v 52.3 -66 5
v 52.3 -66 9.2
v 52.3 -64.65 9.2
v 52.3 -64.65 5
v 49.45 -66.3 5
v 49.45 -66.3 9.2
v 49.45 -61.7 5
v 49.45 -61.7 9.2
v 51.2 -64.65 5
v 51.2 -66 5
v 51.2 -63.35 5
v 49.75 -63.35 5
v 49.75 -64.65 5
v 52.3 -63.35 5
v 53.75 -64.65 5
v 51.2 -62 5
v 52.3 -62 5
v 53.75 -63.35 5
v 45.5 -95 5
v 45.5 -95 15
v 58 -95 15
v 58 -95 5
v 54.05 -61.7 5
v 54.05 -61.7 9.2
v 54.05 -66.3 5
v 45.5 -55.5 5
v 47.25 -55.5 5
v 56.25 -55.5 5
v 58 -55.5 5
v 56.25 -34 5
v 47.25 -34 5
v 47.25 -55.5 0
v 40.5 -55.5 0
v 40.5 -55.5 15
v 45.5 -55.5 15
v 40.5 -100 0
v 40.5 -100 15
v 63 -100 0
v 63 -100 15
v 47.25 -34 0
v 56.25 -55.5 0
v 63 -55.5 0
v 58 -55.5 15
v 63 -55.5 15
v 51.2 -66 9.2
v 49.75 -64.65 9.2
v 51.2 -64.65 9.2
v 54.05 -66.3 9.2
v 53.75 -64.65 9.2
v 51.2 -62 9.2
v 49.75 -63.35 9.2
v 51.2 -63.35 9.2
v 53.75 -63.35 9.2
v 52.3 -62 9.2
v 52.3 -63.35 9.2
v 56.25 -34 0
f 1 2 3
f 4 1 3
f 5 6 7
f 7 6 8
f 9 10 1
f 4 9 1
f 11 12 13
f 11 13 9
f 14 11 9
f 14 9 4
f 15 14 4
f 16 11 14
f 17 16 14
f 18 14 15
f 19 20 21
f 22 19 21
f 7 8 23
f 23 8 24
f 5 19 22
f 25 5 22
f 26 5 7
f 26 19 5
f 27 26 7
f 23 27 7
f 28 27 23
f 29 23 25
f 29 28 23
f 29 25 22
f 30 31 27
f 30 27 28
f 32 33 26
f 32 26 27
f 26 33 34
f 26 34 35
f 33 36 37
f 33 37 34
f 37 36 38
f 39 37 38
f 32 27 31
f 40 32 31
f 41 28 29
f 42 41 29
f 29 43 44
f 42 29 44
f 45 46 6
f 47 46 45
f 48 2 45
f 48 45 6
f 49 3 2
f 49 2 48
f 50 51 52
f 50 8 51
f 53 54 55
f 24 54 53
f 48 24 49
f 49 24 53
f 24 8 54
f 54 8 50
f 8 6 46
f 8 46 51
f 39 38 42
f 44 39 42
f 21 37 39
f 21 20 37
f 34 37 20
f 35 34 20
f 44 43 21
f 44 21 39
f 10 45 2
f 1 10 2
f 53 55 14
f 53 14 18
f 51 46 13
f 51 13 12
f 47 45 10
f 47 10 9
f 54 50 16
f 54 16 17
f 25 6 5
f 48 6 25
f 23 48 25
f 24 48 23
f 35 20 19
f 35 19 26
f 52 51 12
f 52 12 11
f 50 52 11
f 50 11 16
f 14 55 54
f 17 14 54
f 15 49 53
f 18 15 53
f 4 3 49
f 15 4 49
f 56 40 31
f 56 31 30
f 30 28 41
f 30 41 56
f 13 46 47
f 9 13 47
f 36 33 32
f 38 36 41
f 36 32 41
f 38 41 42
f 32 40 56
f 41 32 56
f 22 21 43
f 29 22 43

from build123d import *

# Parameters (mm, degrees)
SKETCH_W        = 22.5
SKETCH_H        = 66
PAD_DEPTH       = 15
SKETCH001_W     = 12.5
SKETCH001_H     = 75
SKETCH001_W_2   = 4.6
SKETCH001_H_2   = 4.6
POCKET_DEPTH    = 10
SKETCH002_W     = 7
SKETCH002_H     = 7
POCKET001_DEPTH = 5.8
SKETCH004_W     = 1.1
SKETCH004_H     = 4
POCKET002_DEPTH = 10
SKETCH005_W     = 4
SKETCH005_H     = 1.3
POCKET003_DEPTH = 10
SKETCH007_W     = 19.75
SKETCH007_H     = 26.5
SKETCH007_W_2   = 17.25
POCKET004_DEPTH = 20


with BuildPart() as part:
    # Sketch → Pad (new body)
    with BuildSketch(Plane.XY):
        with Locations((51.75, -67)):
            Rectangle(SKETCH_W, SKETCH_H)
    extrude(amount=PAD_DEPTH)

    # Sketch001 (on DatumPlane) → Pocket (cut)
    with BuildSketch(Plane.XY.offset(15)):
        with Locations((51.75, -57.5)):
            Rectangle(SKETCH001_W, SKETCH001_H)
        with Locations((51.75, -64)):
            Rectangle(SKETCH001_W_2, SKETCH001_H_2, mode=Mode.SUBTRACT)
    extrude(amount=-POCKET_DEPTH, mode=Mode.SUBTRACT)

    # Sketch002 (on DatumPlane) → Pocket001 (cut)
    with BuildSketch(Plane.XY.offset(15)):
        with Locations((51.5, -63.5)):
            Rectangle(SKETCH002_W, SKETCH002_H)
    extrude(amount=-POCKET001_DEPTH, mode=Mode.SUBTRACT)

    # Sketch004 (on DatumPlane) → Pocket002 (cut)
    with BuildSketch(Plane.XY.offset(15)):
        with Locations((51.75, -64)):
            Rectangle(SKETCH004_W, SKETCH004_H)
    extrude(amount=-POCKET002_DEPTH, mode=Mode.SUBTRACT)

    # Sketch005 (on DatumPlane) → Pocket003 (cut)
    with BuildSketch(Plane.XY.offset(15)):
        with Locations((51.75, -64)):
            Rectangle(SKETCH005_W, SKETCH005_H)
    extrude(amount=-POCKET003_DEPTH, mode=Mode.SUBTRACT)

    # Sketch007 (on DatumPlane) → Pocket004 (cut)
    with BuildSketch(Plane.XY.offset(15)):
        with Locations((66.125, -42.25)):
            Rectangle(SKETCH007_W, SKETCH007_H)
        with Locations((38.625, -42.25)):
            Rectangle(SKETCH007_W_2, SKETCH007_H)
    extrude(amount=-POCKET004_DEPTH, mode=Mode.SUBTRACT)


solid = part.part
